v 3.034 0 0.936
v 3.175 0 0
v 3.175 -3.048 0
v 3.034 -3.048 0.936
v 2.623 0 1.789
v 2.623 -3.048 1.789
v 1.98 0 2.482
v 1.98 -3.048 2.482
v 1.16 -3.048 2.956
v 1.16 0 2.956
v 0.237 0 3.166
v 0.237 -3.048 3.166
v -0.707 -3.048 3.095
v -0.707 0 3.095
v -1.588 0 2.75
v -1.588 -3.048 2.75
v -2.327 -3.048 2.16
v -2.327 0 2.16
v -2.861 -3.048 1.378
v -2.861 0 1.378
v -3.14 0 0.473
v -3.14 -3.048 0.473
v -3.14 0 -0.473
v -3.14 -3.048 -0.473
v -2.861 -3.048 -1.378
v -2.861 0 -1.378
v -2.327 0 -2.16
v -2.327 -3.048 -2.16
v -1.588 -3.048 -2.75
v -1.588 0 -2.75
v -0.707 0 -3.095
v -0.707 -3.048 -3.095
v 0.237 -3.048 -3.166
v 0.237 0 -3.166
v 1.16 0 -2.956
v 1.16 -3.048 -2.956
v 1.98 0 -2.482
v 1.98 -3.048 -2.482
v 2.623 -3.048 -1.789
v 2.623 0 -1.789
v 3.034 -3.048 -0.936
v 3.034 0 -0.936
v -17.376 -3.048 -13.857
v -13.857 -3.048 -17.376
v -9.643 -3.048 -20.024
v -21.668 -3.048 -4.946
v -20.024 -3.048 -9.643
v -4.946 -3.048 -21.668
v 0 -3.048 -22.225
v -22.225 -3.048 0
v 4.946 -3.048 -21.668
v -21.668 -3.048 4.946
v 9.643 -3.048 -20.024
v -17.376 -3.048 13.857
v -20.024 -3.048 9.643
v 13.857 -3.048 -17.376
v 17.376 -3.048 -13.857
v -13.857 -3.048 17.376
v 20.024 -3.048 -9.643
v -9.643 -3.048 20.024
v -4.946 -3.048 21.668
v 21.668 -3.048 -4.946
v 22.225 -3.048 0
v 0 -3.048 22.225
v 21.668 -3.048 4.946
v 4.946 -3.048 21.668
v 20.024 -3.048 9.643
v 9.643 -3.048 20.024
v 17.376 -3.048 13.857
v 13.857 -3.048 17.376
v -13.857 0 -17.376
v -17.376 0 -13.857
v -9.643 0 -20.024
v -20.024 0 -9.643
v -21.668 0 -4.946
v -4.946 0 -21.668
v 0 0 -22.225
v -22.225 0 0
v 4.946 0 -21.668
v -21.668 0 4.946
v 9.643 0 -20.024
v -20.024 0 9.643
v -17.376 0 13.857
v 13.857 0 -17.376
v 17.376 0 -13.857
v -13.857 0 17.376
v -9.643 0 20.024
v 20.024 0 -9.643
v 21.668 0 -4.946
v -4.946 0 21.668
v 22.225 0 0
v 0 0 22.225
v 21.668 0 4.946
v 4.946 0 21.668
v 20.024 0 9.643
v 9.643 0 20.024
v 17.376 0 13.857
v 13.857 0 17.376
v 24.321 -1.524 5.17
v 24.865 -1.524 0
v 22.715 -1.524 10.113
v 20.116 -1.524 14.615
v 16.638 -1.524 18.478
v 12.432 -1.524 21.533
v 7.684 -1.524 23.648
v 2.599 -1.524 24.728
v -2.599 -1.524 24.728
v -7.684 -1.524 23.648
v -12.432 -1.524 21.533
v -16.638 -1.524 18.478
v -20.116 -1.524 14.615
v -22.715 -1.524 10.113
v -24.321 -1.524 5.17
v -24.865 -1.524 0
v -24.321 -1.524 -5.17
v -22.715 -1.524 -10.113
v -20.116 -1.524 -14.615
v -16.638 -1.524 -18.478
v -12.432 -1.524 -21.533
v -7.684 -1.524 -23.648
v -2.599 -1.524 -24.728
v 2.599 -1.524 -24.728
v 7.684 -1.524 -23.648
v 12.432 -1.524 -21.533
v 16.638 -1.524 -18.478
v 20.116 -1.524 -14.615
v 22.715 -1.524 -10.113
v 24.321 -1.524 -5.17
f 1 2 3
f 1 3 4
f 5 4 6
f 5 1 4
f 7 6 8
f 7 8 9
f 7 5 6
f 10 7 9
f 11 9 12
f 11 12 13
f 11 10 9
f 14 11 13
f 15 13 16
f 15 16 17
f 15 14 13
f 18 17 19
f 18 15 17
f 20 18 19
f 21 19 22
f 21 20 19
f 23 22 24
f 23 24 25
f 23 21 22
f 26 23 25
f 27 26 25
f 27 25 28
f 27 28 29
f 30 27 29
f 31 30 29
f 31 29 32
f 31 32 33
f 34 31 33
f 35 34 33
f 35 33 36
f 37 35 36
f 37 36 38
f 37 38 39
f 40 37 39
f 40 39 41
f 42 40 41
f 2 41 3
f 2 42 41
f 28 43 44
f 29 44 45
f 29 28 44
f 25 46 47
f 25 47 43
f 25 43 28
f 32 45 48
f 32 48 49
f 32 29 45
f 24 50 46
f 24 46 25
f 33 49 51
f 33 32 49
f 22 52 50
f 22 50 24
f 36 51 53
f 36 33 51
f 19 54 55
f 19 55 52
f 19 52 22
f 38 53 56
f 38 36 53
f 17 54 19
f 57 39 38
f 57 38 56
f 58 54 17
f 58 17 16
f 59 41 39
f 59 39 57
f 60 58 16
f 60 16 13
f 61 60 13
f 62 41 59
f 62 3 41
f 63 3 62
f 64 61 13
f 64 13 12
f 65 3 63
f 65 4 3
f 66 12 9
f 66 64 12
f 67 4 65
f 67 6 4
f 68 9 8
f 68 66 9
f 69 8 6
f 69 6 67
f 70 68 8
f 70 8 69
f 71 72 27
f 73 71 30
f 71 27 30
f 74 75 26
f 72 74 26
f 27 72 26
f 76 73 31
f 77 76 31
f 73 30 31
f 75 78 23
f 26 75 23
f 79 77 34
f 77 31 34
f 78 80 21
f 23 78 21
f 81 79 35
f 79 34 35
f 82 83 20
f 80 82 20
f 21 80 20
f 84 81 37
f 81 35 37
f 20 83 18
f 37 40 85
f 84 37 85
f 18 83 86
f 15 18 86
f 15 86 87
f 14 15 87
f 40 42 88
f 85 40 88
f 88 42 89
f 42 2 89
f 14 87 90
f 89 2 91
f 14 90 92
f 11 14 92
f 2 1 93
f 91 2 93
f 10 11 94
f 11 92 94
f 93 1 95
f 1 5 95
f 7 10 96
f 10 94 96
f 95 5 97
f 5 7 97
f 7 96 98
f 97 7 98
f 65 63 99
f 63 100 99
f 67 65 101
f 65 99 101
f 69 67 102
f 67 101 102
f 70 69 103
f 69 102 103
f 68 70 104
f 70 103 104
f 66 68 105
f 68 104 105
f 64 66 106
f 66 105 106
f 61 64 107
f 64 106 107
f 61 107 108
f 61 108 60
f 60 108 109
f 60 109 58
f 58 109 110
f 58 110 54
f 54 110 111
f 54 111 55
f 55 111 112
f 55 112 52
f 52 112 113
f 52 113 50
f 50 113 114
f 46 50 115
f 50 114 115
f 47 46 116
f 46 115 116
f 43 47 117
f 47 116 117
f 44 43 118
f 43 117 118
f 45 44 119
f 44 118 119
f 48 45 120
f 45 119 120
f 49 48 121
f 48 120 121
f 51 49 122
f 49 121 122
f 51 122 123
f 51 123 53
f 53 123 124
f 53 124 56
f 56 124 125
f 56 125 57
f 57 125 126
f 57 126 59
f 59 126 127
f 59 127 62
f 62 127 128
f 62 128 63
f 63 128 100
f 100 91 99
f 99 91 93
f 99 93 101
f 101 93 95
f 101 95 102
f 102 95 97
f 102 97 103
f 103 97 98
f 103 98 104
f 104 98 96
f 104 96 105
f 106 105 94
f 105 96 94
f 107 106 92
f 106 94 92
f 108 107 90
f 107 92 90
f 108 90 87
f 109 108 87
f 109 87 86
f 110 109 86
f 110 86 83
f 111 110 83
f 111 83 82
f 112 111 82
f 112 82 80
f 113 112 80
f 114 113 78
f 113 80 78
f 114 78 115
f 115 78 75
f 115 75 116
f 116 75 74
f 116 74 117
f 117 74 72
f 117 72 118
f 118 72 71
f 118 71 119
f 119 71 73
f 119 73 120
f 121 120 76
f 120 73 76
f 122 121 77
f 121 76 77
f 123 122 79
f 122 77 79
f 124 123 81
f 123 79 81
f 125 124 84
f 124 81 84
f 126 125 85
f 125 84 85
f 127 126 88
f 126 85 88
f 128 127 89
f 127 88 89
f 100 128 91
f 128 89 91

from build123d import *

# Parameters (mm, degrees)
F0_R     = 25.4
F0_R_2   = 3.175
F1_DEPTH = 3.048
F2_SIZE2 = 1.8330871047
F2_SIZE  = 3.175


# Not quite as in the source:
# - a fillet or chamfer that OpenCascade refuses, or shapes differently, is made with other operations: its cross-section is extruded or revolved along the edge and cut away or added


with BuildPart() as f1:
    # F0 (on Front) → F1 (new body)
    with BuildSketch(Plane.XZ):
        Circle(F0_R)
        Circle(F0_R_2, mode=Mode.SUBTRACT)
    extrude(amount=F1_DEPTH)

    # F2
    f2_edges = [f1.edges().sort_by_distance(p)[0] for p in [
        (-25.4, -3.048, 0),
    ]]
    f2_side = f1.faces().sort_by_distance((-24.68158, -3.048, 0))[0]
    chamfer(f2_edges, length=F2_SIZE, length2=F2_SIZE2, reference=f2_side)

    # F3: chamfer of 3.175 x 1.8330871047 on 1 edges, made by hand

    # F3_s1 → F3_t2 (revolve, cut)
    with BuildSketch(Plane.XY):
        Polygon((25.4, -1.8330871047), (22.225, 0), (25.4, 0), align=None)
    revolve(axis=Axis((0, 0, 0), (0, -1, 0)), mode=Mode.SUBTRACT)


solid = f1.part
